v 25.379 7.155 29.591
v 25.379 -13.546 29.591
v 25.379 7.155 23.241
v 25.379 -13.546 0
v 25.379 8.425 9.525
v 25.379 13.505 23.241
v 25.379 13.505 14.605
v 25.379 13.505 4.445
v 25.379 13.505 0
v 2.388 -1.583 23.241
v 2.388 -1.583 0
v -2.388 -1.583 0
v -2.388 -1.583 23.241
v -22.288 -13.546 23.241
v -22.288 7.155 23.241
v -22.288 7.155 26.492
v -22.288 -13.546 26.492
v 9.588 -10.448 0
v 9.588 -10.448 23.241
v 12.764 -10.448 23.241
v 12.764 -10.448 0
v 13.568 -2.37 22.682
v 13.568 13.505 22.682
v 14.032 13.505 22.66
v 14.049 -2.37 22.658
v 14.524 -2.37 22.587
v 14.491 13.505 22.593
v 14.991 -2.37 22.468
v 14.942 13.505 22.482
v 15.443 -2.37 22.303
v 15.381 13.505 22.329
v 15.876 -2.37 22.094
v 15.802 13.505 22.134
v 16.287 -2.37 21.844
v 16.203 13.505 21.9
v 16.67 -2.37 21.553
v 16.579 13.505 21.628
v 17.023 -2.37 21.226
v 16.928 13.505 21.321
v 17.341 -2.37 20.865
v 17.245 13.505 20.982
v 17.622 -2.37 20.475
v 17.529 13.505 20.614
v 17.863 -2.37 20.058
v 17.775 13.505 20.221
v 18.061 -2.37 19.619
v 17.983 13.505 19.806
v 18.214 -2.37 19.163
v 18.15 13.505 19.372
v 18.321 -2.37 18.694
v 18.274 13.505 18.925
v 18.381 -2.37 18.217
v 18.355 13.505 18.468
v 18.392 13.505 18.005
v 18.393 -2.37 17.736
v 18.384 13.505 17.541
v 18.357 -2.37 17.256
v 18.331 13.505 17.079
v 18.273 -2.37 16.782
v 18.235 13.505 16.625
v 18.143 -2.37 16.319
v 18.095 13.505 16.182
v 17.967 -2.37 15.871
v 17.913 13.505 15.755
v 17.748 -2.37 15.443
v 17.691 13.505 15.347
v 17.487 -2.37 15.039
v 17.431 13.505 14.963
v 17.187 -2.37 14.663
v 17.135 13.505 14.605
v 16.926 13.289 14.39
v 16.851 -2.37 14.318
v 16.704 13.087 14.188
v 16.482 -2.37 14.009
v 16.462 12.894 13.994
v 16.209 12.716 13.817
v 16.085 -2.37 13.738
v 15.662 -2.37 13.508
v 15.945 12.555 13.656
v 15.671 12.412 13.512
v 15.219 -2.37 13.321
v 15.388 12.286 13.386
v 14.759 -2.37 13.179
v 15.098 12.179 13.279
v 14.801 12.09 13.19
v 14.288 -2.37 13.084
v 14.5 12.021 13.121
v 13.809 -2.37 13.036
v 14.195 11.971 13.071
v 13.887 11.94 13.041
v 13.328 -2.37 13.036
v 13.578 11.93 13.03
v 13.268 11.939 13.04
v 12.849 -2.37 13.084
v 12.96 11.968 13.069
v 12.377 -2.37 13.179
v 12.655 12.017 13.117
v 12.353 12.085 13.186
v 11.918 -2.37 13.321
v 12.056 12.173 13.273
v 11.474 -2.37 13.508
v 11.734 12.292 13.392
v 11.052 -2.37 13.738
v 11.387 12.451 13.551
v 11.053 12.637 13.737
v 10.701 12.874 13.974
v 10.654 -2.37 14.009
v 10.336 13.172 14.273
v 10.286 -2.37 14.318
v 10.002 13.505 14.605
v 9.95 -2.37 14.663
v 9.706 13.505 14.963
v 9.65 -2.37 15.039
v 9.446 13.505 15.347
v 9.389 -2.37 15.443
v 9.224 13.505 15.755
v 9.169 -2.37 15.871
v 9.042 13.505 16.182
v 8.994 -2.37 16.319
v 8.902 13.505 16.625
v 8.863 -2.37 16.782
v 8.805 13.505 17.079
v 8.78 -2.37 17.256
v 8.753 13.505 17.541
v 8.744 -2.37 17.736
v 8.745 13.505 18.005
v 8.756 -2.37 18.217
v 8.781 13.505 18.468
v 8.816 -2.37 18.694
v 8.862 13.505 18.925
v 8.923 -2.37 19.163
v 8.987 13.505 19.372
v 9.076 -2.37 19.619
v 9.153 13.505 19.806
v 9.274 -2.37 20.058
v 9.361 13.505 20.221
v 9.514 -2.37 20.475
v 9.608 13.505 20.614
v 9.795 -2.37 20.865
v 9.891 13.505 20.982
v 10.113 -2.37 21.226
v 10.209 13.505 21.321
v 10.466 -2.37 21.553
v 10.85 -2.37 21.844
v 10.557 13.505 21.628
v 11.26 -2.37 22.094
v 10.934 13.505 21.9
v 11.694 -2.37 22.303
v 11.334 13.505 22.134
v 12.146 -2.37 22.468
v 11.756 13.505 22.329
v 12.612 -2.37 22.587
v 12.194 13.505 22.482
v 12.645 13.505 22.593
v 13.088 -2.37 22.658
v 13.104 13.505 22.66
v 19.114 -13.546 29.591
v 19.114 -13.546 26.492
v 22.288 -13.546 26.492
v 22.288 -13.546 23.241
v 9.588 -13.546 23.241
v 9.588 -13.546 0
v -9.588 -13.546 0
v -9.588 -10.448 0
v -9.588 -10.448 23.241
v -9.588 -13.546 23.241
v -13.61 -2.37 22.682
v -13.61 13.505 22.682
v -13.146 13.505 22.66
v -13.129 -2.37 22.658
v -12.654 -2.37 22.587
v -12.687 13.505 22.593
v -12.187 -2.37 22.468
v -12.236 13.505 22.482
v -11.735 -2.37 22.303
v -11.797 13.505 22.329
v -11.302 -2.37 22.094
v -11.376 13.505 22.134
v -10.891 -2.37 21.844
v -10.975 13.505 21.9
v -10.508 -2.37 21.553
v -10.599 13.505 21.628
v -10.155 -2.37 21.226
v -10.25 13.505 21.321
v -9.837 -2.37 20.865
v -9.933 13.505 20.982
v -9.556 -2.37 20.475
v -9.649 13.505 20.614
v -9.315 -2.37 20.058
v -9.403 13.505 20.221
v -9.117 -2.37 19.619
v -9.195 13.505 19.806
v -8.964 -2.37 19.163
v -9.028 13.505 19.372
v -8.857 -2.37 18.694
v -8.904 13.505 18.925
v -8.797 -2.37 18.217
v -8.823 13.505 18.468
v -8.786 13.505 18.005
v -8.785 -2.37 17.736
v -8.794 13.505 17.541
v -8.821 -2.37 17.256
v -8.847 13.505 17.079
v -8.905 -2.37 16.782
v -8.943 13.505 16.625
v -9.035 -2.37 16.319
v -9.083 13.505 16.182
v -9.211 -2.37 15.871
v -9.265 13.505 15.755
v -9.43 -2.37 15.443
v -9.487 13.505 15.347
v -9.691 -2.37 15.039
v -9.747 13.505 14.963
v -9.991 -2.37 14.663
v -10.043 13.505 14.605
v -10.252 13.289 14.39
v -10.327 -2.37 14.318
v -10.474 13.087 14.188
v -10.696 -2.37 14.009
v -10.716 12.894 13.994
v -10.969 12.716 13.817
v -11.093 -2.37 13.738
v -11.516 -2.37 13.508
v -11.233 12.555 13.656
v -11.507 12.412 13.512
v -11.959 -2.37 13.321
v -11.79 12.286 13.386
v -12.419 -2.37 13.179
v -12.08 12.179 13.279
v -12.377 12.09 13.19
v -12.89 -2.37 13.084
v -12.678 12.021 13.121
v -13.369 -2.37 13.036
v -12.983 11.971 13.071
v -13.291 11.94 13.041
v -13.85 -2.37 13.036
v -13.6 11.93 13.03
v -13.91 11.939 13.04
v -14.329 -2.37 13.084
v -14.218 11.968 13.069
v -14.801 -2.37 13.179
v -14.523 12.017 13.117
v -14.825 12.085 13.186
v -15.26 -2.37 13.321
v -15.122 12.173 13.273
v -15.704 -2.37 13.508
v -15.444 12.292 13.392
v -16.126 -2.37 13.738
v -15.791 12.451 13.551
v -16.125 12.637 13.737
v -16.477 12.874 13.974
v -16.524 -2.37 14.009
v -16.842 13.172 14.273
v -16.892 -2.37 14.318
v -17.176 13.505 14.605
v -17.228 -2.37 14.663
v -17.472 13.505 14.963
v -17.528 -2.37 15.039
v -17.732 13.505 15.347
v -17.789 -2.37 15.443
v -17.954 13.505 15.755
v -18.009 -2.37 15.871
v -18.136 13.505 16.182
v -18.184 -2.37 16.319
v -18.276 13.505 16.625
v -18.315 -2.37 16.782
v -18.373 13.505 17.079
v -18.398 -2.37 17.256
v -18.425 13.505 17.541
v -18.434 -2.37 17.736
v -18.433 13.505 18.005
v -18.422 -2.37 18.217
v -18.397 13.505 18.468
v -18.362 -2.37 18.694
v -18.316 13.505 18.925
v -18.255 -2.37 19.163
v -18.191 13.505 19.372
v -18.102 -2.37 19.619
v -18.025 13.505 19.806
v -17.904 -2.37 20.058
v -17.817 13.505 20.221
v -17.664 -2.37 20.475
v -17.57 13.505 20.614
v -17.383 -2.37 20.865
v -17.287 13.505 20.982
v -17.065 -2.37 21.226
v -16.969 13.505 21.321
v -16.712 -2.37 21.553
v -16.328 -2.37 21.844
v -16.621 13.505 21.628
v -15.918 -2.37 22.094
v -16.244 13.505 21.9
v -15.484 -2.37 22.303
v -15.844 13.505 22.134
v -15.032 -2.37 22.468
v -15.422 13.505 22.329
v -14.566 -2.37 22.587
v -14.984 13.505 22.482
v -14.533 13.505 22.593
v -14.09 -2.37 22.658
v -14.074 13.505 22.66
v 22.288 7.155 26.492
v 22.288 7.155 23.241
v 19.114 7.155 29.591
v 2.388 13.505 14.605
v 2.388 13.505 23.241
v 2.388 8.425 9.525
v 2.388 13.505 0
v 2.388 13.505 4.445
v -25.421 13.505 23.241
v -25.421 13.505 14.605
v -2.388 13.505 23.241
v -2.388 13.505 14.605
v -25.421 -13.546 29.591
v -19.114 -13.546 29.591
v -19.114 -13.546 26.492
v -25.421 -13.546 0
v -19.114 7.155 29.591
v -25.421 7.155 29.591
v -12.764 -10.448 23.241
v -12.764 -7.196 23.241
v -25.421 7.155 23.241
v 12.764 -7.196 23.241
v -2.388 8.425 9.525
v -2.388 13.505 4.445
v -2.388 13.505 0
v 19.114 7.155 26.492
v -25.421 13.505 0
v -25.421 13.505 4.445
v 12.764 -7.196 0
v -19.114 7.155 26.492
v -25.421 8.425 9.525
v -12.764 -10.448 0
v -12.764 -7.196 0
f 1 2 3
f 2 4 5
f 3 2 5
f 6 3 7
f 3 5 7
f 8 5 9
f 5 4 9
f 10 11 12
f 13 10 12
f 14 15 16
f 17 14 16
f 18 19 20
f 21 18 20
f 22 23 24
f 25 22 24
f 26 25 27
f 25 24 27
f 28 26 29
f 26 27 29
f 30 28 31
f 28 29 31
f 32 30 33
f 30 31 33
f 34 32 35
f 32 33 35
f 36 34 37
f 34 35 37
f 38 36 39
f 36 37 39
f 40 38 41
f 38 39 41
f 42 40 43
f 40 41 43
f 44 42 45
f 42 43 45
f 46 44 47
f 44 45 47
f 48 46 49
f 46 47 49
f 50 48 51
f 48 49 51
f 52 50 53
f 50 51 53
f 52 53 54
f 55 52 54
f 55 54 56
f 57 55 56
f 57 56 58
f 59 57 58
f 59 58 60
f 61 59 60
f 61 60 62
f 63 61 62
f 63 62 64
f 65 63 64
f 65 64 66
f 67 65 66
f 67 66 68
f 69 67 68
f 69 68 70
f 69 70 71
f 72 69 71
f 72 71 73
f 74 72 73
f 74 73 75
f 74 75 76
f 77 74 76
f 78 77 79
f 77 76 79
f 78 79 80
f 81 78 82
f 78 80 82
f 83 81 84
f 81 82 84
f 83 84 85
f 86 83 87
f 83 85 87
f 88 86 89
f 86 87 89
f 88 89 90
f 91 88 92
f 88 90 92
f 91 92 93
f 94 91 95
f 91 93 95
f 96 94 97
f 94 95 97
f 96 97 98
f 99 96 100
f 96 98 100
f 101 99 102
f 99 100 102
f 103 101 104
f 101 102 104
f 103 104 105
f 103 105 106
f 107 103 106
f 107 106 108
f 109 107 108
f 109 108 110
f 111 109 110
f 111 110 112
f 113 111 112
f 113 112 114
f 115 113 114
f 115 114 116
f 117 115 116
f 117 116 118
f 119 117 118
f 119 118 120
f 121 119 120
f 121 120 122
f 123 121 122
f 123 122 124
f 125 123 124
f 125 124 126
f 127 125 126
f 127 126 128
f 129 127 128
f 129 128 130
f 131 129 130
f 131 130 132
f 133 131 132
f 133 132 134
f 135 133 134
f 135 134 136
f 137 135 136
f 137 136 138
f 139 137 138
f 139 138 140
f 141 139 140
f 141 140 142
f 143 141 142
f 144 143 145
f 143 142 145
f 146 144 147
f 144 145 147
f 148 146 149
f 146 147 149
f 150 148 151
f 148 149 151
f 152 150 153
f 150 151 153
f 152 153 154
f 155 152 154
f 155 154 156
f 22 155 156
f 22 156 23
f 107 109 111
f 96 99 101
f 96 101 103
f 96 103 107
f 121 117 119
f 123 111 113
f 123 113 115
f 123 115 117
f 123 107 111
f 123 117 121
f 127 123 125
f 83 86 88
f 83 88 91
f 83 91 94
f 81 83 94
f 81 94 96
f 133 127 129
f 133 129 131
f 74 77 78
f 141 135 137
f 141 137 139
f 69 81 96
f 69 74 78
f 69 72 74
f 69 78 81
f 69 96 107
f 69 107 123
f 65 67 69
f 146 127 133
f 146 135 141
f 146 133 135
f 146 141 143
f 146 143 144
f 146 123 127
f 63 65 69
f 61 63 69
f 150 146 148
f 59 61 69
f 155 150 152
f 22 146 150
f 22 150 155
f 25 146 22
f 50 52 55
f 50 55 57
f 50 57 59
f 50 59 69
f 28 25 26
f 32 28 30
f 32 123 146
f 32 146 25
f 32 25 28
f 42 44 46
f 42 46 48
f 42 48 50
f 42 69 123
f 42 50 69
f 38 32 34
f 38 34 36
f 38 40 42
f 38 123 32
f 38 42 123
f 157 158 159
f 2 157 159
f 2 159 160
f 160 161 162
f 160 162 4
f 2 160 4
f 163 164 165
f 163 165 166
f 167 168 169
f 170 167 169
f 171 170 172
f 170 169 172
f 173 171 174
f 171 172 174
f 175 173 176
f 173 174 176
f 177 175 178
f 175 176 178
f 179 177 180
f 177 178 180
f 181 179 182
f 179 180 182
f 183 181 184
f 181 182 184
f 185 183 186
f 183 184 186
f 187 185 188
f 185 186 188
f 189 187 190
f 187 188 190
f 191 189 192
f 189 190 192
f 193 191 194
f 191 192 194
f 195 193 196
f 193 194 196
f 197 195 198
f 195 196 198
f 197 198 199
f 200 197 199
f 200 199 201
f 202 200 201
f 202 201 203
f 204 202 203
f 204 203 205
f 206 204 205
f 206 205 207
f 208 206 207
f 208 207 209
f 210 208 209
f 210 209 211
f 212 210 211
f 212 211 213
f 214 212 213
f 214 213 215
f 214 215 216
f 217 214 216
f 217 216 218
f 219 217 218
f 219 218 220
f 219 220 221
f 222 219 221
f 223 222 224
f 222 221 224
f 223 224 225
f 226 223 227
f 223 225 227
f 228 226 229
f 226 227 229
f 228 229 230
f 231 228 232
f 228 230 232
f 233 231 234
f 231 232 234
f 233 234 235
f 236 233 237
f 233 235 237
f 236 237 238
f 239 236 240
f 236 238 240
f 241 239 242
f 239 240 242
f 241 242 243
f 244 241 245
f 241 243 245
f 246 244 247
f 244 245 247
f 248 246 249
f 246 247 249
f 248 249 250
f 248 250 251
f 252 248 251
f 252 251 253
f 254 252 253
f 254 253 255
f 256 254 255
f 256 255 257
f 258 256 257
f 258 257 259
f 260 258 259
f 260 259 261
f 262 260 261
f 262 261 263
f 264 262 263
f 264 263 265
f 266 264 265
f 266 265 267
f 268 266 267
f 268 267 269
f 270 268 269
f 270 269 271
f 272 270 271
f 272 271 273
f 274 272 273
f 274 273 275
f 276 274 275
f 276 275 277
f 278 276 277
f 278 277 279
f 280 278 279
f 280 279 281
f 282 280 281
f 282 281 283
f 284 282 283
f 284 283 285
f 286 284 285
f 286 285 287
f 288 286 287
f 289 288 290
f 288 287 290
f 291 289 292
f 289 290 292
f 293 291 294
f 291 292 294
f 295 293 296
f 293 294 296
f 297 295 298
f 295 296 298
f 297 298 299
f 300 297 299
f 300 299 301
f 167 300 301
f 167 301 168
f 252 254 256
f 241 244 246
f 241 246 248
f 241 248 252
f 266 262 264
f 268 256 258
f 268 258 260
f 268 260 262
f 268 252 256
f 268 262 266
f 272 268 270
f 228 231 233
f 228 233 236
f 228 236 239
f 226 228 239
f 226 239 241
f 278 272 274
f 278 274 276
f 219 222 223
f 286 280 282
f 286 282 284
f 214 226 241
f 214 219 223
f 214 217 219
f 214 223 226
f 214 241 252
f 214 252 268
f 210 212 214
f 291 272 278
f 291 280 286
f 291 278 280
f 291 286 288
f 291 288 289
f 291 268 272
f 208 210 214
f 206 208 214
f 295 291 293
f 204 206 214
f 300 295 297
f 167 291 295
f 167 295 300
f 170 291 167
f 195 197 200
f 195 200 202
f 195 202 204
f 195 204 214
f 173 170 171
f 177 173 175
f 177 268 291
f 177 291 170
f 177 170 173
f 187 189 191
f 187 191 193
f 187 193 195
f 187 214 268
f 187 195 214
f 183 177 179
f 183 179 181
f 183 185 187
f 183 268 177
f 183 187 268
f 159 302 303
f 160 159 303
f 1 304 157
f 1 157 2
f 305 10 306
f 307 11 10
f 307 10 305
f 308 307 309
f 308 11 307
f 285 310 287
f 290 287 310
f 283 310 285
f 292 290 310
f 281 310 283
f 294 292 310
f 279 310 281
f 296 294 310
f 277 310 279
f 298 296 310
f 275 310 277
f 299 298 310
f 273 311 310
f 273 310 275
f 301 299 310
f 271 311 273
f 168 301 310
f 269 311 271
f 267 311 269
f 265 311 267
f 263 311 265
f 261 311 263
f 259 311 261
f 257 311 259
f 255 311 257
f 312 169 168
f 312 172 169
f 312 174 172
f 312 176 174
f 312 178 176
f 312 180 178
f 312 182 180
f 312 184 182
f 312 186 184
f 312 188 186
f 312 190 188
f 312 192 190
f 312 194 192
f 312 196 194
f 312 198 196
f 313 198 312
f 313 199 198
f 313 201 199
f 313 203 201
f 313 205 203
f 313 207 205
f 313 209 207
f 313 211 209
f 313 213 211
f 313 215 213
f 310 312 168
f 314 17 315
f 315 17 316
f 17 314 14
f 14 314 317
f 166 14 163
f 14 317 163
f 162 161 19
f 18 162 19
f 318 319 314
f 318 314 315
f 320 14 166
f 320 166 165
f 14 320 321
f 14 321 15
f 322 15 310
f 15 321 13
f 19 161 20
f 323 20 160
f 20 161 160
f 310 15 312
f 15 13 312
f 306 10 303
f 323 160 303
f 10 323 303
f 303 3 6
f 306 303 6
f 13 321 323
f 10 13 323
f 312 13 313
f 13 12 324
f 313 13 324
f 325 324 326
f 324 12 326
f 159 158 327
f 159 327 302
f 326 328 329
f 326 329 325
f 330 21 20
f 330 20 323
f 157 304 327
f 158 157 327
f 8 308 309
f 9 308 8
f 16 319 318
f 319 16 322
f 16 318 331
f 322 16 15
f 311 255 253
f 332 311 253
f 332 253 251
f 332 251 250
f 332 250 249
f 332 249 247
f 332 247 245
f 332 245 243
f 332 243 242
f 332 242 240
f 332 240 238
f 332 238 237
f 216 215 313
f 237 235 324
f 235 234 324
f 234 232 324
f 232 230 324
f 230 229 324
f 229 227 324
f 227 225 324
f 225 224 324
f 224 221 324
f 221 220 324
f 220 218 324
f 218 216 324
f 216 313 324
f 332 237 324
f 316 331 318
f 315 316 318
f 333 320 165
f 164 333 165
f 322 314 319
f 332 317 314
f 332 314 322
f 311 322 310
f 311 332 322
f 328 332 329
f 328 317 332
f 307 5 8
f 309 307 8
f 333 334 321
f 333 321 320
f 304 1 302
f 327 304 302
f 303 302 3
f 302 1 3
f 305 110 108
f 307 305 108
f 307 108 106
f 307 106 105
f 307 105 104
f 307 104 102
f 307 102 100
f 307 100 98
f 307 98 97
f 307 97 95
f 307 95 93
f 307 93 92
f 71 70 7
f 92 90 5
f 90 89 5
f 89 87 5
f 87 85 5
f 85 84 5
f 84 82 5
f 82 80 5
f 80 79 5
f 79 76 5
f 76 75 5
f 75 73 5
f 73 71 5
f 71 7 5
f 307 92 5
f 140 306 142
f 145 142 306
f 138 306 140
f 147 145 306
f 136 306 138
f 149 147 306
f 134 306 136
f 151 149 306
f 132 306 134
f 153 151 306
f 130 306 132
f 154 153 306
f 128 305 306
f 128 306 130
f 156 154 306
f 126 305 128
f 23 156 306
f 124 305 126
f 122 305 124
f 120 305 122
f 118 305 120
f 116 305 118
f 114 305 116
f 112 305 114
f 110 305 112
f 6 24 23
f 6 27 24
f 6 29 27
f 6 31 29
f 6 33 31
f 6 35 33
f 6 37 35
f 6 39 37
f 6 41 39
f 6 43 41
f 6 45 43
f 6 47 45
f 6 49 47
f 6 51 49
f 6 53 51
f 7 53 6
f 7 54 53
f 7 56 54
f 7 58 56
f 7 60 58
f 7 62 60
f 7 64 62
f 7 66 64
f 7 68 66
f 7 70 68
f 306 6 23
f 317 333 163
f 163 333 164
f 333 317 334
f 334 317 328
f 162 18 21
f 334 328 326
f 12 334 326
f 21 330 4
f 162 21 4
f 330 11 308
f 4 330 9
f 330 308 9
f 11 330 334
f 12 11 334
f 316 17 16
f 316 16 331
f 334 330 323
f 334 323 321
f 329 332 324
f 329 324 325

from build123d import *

# Parameters (mm, degrees)
CROQUIS1_W              = 50.8
CROQUIS1_H              = 27.051
SALIENTE_EXTRUIR1_DEPTH = 29.591
CORTAR_EXTRUIR1_DEPTH   = 42.295883595
CROQUIS8_W              = 4.7752
CROQUIS8_H              = 15.0876
CORTAR_EXTRUIR2_DEPTH   = 42.295883595
CORTAR_EXTRUIR3_DEPTH   = 48.472095113
CROQUIS12_R             = 4.826
CORTAR_EXTRUIR4_DEPTH   = 15.875
CROQUIS13_W             = 6.35
CROQUIS13_H             = 6.35
CORTAR_EXTRUIR5_DEPTH   = 61.330540106
CORTAR_EXTRUIR6_DEPTH   = 61.330540106


with BuildPart() as part:
    # Croquis1 → Saliente-Extruir1 (new body)
    with BuildSketch(Plane.XY):
        with Locations((-0.020777573, -0.020967748)):
            Rectangle(CROQUIS1_W, CROQUIS1_H)
    extrude(amount=SALIENTE_EXTRUIR1_DEPTH)

    # Croquis7 → Cortar-Extruir1 (cut, through all)
    with BuildSketch(Plane(origin=(0, 0, 0), x_dir=(-1, 0, 0), z_dir=(0, 0, -1))):
        Polygon((-12.7635, -7.196467748), (12.7635, -7.196467748), (12.7635, -10.447667748), (9.5885, -10.447667748), (9.5885, -13.546467748), (-9.5885, -13.546467748), (-9.5885, -10.447667748), (-12.7635, -10.447667748), align=None)
    extrude(amount=-CORTAR_EXTRUIR1_DEPTH, mode=Mode.SUBTRACT)

    # Croquis8 → Cortar-Extruir2 (cut, through all)
    with BuildSketch(Plane(origin=(0, 0, 0), x_dir=(-1, 0, 0), z_dir=(0, 0, -1))):
        with Locations((0, 5.960732252)):
            Rectangle(CROQUIS8_W, CROQUIS8_H)
    extrude(amount=-CORTAR_EXTRUIR2_DEPTH, mode=Mode.SUBTRACT)

    # Croquis9 → Cortar-Extruir3 (cut, through all)
    with BuildSketch(Plane(origin=(0, 13.504532252, 0), x_dir=(1, 0, 0), z_dir=(0, 1, 0))):
        Polygon((-19.1135, -29.591), (19.1135, -29.591), (19.1135, -26.4922), (22.2885, -26.4922), (22.2885, -23.241), (-22.2885, -23.241), (-22.2885, -26.4922), (-19.1135, -26.4922), align=None)
    extrude(amount=-CORTAR_EXTRUIR3_DEPTH, mode=Mode.SUBTRACT)

    # Croquis12 → Cortar-Extruir4 (cut)
    with BuildSketch(Plane(origin=(0, 13.504532252, 0), x_dir=(1, 0, 0), z_dir=(0, 1, 0))):
        with Locations(Location((-13.609777573, -17.8562, 0), (0, 0, 270))):
            Circle(CROQUIS12_R)
        with Locations(Location((13.568222427, -17.8562, 0), (0, 0, 270))):
            Circle(CROQUIS12_R)
    extrude(amount=-CORTAR_EXTRUIR4_DEPTH, mode=Mode.SUBTRACT)

    # Croquis13 → Cortar-Extruir5 (cut, through all)
    with BuildSketch(Plane(origin=(25.379222427, 0, 0), x_dir=(0, 0, -1), z_dir=(1, 0, 0))):
        with Locations((-26.416, 10.329532252)):
            Rectangle(CROQUIS13_W, CROQUIS13_H)
    extrude(amount=-CORTAR_EXTRUIR5_DEPTH, mode=Mode.SUBTRACT)

    # Croquis14 → Cortar-Extruir6 (cut, through all)
    with BuildSketch(Plane(origin=(25.379222427, 0, 0), x_dir=(0, 0, -1), z_dir=(1, 0, 0))):
        Polygon((-9.525, 8.424532252), (-4.445, 13.504532252), (-14.605, 13.504532252), align=None)
    extrude(amount=-CORTAR_EXTRUIR6_DEPTH, mode=Mode.SUBTRACT)


solid = part.part
